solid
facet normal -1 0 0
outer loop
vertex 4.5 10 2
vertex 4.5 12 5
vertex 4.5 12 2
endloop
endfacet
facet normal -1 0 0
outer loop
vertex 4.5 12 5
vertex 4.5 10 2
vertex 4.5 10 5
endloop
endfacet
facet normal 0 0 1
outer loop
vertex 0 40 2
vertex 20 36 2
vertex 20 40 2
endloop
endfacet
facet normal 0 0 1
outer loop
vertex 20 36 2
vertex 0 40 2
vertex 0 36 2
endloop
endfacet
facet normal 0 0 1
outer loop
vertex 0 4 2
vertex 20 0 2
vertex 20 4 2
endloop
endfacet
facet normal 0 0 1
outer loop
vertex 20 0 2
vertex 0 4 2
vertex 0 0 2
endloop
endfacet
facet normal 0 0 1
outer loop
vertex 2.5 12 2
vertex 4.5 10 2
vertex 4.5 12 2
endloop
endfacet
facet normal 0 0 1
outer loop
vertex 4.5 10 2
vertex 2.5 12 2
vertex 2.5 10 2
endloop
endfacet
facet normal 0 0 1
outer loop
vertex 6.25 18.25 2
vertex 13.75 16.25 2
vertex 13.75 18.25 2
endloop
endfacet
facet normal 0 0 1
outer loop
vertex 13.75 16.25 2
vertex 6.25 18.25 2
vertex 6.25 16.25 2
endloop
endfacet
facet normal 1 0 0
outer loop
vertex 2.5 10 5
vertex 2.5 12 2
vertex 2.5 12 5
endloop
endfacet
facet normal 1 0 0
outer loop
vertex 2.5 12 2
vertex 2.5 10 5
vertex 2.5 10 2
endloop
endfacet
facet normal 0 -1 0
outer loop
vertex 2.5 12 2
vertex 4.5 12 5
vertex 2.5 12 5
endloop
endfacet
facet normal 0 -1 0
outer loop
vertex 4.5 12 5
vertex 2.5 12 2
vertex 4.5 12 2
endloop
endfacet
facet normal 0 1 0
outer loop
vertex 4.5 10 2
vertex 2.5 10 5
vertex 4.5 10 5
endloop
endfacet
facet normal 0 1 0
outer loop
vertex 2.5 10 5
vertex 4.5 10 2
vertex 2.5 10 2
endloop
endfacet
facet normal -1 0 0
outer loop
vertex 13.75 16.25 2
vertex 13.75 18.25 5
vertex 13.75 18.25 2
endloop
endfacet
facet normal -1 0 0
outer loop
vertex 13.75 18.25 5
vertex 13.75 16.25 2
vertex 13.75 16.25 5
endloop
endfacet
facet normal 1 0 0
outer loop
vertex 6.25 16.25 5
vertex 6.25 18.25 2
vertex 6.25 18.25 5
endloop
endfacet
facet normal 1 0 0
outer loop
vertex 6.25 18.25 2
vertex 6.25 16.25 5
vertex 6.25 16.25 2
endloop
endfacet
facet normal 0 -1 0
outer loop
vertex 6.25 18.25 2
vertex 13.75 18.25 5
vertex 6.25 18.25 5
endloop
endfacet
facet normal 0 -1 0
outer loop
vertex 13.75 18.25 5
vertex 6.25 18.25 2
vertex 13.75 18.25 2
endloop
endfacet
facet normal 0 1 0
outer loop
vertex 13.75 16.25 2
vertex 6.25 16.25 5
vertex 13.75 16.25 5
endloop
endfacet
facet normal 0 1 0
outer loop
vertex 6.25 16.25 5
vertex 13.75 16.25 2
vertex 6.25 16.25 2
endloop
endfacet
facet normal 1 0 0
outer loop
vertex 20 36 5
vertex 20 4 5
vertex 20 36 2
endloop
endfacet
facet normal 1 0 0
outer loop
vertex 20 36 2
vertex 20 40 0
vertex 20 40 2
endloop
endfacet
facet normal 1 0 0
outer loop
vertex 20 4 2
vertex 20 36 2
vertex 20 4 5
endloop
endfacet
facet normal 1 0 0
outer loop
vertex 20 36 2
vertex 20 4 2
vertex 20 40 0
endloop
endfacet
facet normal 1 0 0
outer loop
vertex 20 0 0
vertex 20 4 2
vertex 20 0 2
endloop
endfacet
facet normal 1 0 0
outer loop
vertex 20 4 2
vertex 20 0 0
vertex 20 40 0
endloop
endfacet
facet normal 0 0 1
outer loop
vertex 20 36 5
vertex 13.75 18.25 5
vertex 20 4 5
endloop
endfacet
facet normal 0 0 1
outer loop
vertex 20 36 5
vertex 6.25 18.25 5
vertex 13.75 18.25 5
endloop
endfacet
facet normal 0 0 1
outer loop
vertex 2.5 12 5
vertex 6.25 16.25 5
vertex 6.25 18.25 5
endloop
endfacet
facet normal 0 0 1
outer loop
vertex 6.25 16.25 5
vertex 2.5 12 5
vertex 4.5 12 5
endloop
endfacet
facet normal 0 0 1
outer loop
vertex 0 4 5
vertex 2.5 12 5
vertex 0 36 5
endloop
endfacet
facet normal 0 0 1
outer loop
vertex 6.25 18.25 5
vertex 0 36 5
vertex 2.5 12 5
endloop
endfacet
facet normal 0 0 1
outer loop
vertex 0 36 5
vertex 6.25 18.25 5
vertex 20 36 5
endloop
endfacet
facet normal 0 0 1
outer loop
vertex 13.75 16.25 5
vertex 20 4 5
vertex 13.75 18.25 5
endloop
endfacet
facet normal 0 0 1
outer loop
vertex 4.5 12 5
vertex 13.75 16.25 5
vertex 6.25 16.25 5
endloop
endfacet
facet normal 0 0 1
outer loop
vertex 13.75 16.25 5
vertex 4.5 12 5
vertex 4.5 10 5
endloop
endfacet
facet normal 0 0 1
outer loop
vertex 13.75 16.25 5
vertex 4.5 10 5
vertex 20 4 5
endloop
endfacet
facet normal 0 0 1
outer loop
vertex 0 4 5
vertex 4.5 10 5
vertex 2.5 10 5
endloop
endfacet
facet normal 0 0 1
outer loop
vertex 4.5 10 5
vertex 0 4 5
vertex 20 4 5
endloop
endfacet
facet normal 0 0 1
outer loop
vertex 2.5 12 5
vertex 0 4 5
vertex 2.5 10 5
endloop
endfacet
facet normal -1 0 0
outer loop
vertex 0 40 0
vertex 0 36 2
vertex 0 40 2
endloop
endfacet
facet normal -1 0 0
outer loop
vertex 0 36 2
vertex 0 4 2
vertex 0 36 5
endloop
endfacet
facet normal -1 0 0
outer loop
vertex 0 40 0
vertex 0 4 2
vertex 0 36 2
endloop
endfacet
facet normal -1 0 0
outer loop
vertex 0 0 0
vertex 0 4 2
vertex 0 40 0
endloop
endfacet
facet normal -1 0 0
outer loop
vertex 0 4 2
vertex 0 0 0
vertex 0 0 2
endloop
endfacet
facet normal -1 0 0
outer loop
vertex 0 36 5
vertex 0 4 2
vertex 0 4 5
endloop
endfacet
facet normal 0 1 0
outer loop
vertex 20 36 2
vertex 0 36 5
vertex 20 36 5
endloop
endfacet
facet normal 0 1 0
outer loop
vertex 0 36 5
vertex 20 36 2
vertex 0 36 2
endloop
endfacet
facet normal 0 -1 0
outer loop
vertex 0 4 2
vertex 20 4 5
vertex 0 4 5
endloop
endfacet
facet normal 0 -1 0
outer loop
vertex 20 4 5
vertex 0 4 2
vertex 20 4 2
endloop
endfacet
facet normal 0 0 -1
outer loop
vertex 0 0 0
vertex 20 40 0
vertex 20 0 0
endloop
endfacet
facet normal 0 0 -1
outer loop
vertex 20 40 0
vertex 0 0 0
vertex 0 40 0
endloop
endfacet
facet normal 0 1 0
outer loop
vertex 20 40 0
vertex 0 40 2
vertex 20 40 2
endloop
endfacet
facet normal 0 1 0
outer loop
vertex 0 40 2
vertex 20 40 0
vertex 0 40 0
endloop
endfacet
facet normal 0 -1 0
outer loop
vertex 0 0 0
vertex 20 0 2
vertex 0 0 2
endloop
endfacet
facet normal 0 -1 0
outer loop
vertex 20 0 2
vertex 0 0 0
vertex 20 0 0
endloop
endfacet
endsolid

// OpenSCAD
/*
	name: 		fixme-price-list-cents-frame.scad
	author:		Aymeric B.
	date:		03.09.2014
*/

use <francs-digits.scad>;

/****** PARAMETERS ****/
$fn = 50;
fudge = 0.1;
_thickness = 2;
_clearance = 0.1;

_frame_height = 40;
_frame_width = 20;
_cleat_size = 4;
_cleat_elevation = 2;
_elevation = 5;
print = 0;

/****** MODULES ****/
module RoundingEdge(radius, length) {	
	difference() {
		translate([0, 0, -_clearance]) {
			cube([2*radius+_clearance, 
					2*radius+_clearance, 
					length+2*_clearance]);
		}
		translate([0, 0, -2*_clearance]) {
			cylinder(r=radius,h=length+4*_clearance);
		}
	}
}

module BackPlate(width, height, thickness) {
	cube([width, height, thickness]);
}

module FrameFull(width, height, elevation) {
	cube([width, height, elevation]);
}

module Draw(number) {
	BackPlate(_frame_width, _frame_height, _cleat_elevation);
	translate([0, _cleat_size, _cleat_elevation]) {
		difference() {
			FrameFull(_frame_width, 
							_frame_height-2*_cleat_size, 
							_elevation-_cleat_elevation);
			translate([_frame_width/2, _frame_height/2-_cleat_size, 0]) {
				cents_digits(print, _elevation);
			}
		}
	}
}

module cents() {
	cents_digits(99, 5);
}

/****** RENDERS ****/
if (print >= 0 && print <= 99) {
	echo ("Call Draw(print)");
	Draw();
} else {
	echo ("ERROR: print must be between 0 and 99.");
}
